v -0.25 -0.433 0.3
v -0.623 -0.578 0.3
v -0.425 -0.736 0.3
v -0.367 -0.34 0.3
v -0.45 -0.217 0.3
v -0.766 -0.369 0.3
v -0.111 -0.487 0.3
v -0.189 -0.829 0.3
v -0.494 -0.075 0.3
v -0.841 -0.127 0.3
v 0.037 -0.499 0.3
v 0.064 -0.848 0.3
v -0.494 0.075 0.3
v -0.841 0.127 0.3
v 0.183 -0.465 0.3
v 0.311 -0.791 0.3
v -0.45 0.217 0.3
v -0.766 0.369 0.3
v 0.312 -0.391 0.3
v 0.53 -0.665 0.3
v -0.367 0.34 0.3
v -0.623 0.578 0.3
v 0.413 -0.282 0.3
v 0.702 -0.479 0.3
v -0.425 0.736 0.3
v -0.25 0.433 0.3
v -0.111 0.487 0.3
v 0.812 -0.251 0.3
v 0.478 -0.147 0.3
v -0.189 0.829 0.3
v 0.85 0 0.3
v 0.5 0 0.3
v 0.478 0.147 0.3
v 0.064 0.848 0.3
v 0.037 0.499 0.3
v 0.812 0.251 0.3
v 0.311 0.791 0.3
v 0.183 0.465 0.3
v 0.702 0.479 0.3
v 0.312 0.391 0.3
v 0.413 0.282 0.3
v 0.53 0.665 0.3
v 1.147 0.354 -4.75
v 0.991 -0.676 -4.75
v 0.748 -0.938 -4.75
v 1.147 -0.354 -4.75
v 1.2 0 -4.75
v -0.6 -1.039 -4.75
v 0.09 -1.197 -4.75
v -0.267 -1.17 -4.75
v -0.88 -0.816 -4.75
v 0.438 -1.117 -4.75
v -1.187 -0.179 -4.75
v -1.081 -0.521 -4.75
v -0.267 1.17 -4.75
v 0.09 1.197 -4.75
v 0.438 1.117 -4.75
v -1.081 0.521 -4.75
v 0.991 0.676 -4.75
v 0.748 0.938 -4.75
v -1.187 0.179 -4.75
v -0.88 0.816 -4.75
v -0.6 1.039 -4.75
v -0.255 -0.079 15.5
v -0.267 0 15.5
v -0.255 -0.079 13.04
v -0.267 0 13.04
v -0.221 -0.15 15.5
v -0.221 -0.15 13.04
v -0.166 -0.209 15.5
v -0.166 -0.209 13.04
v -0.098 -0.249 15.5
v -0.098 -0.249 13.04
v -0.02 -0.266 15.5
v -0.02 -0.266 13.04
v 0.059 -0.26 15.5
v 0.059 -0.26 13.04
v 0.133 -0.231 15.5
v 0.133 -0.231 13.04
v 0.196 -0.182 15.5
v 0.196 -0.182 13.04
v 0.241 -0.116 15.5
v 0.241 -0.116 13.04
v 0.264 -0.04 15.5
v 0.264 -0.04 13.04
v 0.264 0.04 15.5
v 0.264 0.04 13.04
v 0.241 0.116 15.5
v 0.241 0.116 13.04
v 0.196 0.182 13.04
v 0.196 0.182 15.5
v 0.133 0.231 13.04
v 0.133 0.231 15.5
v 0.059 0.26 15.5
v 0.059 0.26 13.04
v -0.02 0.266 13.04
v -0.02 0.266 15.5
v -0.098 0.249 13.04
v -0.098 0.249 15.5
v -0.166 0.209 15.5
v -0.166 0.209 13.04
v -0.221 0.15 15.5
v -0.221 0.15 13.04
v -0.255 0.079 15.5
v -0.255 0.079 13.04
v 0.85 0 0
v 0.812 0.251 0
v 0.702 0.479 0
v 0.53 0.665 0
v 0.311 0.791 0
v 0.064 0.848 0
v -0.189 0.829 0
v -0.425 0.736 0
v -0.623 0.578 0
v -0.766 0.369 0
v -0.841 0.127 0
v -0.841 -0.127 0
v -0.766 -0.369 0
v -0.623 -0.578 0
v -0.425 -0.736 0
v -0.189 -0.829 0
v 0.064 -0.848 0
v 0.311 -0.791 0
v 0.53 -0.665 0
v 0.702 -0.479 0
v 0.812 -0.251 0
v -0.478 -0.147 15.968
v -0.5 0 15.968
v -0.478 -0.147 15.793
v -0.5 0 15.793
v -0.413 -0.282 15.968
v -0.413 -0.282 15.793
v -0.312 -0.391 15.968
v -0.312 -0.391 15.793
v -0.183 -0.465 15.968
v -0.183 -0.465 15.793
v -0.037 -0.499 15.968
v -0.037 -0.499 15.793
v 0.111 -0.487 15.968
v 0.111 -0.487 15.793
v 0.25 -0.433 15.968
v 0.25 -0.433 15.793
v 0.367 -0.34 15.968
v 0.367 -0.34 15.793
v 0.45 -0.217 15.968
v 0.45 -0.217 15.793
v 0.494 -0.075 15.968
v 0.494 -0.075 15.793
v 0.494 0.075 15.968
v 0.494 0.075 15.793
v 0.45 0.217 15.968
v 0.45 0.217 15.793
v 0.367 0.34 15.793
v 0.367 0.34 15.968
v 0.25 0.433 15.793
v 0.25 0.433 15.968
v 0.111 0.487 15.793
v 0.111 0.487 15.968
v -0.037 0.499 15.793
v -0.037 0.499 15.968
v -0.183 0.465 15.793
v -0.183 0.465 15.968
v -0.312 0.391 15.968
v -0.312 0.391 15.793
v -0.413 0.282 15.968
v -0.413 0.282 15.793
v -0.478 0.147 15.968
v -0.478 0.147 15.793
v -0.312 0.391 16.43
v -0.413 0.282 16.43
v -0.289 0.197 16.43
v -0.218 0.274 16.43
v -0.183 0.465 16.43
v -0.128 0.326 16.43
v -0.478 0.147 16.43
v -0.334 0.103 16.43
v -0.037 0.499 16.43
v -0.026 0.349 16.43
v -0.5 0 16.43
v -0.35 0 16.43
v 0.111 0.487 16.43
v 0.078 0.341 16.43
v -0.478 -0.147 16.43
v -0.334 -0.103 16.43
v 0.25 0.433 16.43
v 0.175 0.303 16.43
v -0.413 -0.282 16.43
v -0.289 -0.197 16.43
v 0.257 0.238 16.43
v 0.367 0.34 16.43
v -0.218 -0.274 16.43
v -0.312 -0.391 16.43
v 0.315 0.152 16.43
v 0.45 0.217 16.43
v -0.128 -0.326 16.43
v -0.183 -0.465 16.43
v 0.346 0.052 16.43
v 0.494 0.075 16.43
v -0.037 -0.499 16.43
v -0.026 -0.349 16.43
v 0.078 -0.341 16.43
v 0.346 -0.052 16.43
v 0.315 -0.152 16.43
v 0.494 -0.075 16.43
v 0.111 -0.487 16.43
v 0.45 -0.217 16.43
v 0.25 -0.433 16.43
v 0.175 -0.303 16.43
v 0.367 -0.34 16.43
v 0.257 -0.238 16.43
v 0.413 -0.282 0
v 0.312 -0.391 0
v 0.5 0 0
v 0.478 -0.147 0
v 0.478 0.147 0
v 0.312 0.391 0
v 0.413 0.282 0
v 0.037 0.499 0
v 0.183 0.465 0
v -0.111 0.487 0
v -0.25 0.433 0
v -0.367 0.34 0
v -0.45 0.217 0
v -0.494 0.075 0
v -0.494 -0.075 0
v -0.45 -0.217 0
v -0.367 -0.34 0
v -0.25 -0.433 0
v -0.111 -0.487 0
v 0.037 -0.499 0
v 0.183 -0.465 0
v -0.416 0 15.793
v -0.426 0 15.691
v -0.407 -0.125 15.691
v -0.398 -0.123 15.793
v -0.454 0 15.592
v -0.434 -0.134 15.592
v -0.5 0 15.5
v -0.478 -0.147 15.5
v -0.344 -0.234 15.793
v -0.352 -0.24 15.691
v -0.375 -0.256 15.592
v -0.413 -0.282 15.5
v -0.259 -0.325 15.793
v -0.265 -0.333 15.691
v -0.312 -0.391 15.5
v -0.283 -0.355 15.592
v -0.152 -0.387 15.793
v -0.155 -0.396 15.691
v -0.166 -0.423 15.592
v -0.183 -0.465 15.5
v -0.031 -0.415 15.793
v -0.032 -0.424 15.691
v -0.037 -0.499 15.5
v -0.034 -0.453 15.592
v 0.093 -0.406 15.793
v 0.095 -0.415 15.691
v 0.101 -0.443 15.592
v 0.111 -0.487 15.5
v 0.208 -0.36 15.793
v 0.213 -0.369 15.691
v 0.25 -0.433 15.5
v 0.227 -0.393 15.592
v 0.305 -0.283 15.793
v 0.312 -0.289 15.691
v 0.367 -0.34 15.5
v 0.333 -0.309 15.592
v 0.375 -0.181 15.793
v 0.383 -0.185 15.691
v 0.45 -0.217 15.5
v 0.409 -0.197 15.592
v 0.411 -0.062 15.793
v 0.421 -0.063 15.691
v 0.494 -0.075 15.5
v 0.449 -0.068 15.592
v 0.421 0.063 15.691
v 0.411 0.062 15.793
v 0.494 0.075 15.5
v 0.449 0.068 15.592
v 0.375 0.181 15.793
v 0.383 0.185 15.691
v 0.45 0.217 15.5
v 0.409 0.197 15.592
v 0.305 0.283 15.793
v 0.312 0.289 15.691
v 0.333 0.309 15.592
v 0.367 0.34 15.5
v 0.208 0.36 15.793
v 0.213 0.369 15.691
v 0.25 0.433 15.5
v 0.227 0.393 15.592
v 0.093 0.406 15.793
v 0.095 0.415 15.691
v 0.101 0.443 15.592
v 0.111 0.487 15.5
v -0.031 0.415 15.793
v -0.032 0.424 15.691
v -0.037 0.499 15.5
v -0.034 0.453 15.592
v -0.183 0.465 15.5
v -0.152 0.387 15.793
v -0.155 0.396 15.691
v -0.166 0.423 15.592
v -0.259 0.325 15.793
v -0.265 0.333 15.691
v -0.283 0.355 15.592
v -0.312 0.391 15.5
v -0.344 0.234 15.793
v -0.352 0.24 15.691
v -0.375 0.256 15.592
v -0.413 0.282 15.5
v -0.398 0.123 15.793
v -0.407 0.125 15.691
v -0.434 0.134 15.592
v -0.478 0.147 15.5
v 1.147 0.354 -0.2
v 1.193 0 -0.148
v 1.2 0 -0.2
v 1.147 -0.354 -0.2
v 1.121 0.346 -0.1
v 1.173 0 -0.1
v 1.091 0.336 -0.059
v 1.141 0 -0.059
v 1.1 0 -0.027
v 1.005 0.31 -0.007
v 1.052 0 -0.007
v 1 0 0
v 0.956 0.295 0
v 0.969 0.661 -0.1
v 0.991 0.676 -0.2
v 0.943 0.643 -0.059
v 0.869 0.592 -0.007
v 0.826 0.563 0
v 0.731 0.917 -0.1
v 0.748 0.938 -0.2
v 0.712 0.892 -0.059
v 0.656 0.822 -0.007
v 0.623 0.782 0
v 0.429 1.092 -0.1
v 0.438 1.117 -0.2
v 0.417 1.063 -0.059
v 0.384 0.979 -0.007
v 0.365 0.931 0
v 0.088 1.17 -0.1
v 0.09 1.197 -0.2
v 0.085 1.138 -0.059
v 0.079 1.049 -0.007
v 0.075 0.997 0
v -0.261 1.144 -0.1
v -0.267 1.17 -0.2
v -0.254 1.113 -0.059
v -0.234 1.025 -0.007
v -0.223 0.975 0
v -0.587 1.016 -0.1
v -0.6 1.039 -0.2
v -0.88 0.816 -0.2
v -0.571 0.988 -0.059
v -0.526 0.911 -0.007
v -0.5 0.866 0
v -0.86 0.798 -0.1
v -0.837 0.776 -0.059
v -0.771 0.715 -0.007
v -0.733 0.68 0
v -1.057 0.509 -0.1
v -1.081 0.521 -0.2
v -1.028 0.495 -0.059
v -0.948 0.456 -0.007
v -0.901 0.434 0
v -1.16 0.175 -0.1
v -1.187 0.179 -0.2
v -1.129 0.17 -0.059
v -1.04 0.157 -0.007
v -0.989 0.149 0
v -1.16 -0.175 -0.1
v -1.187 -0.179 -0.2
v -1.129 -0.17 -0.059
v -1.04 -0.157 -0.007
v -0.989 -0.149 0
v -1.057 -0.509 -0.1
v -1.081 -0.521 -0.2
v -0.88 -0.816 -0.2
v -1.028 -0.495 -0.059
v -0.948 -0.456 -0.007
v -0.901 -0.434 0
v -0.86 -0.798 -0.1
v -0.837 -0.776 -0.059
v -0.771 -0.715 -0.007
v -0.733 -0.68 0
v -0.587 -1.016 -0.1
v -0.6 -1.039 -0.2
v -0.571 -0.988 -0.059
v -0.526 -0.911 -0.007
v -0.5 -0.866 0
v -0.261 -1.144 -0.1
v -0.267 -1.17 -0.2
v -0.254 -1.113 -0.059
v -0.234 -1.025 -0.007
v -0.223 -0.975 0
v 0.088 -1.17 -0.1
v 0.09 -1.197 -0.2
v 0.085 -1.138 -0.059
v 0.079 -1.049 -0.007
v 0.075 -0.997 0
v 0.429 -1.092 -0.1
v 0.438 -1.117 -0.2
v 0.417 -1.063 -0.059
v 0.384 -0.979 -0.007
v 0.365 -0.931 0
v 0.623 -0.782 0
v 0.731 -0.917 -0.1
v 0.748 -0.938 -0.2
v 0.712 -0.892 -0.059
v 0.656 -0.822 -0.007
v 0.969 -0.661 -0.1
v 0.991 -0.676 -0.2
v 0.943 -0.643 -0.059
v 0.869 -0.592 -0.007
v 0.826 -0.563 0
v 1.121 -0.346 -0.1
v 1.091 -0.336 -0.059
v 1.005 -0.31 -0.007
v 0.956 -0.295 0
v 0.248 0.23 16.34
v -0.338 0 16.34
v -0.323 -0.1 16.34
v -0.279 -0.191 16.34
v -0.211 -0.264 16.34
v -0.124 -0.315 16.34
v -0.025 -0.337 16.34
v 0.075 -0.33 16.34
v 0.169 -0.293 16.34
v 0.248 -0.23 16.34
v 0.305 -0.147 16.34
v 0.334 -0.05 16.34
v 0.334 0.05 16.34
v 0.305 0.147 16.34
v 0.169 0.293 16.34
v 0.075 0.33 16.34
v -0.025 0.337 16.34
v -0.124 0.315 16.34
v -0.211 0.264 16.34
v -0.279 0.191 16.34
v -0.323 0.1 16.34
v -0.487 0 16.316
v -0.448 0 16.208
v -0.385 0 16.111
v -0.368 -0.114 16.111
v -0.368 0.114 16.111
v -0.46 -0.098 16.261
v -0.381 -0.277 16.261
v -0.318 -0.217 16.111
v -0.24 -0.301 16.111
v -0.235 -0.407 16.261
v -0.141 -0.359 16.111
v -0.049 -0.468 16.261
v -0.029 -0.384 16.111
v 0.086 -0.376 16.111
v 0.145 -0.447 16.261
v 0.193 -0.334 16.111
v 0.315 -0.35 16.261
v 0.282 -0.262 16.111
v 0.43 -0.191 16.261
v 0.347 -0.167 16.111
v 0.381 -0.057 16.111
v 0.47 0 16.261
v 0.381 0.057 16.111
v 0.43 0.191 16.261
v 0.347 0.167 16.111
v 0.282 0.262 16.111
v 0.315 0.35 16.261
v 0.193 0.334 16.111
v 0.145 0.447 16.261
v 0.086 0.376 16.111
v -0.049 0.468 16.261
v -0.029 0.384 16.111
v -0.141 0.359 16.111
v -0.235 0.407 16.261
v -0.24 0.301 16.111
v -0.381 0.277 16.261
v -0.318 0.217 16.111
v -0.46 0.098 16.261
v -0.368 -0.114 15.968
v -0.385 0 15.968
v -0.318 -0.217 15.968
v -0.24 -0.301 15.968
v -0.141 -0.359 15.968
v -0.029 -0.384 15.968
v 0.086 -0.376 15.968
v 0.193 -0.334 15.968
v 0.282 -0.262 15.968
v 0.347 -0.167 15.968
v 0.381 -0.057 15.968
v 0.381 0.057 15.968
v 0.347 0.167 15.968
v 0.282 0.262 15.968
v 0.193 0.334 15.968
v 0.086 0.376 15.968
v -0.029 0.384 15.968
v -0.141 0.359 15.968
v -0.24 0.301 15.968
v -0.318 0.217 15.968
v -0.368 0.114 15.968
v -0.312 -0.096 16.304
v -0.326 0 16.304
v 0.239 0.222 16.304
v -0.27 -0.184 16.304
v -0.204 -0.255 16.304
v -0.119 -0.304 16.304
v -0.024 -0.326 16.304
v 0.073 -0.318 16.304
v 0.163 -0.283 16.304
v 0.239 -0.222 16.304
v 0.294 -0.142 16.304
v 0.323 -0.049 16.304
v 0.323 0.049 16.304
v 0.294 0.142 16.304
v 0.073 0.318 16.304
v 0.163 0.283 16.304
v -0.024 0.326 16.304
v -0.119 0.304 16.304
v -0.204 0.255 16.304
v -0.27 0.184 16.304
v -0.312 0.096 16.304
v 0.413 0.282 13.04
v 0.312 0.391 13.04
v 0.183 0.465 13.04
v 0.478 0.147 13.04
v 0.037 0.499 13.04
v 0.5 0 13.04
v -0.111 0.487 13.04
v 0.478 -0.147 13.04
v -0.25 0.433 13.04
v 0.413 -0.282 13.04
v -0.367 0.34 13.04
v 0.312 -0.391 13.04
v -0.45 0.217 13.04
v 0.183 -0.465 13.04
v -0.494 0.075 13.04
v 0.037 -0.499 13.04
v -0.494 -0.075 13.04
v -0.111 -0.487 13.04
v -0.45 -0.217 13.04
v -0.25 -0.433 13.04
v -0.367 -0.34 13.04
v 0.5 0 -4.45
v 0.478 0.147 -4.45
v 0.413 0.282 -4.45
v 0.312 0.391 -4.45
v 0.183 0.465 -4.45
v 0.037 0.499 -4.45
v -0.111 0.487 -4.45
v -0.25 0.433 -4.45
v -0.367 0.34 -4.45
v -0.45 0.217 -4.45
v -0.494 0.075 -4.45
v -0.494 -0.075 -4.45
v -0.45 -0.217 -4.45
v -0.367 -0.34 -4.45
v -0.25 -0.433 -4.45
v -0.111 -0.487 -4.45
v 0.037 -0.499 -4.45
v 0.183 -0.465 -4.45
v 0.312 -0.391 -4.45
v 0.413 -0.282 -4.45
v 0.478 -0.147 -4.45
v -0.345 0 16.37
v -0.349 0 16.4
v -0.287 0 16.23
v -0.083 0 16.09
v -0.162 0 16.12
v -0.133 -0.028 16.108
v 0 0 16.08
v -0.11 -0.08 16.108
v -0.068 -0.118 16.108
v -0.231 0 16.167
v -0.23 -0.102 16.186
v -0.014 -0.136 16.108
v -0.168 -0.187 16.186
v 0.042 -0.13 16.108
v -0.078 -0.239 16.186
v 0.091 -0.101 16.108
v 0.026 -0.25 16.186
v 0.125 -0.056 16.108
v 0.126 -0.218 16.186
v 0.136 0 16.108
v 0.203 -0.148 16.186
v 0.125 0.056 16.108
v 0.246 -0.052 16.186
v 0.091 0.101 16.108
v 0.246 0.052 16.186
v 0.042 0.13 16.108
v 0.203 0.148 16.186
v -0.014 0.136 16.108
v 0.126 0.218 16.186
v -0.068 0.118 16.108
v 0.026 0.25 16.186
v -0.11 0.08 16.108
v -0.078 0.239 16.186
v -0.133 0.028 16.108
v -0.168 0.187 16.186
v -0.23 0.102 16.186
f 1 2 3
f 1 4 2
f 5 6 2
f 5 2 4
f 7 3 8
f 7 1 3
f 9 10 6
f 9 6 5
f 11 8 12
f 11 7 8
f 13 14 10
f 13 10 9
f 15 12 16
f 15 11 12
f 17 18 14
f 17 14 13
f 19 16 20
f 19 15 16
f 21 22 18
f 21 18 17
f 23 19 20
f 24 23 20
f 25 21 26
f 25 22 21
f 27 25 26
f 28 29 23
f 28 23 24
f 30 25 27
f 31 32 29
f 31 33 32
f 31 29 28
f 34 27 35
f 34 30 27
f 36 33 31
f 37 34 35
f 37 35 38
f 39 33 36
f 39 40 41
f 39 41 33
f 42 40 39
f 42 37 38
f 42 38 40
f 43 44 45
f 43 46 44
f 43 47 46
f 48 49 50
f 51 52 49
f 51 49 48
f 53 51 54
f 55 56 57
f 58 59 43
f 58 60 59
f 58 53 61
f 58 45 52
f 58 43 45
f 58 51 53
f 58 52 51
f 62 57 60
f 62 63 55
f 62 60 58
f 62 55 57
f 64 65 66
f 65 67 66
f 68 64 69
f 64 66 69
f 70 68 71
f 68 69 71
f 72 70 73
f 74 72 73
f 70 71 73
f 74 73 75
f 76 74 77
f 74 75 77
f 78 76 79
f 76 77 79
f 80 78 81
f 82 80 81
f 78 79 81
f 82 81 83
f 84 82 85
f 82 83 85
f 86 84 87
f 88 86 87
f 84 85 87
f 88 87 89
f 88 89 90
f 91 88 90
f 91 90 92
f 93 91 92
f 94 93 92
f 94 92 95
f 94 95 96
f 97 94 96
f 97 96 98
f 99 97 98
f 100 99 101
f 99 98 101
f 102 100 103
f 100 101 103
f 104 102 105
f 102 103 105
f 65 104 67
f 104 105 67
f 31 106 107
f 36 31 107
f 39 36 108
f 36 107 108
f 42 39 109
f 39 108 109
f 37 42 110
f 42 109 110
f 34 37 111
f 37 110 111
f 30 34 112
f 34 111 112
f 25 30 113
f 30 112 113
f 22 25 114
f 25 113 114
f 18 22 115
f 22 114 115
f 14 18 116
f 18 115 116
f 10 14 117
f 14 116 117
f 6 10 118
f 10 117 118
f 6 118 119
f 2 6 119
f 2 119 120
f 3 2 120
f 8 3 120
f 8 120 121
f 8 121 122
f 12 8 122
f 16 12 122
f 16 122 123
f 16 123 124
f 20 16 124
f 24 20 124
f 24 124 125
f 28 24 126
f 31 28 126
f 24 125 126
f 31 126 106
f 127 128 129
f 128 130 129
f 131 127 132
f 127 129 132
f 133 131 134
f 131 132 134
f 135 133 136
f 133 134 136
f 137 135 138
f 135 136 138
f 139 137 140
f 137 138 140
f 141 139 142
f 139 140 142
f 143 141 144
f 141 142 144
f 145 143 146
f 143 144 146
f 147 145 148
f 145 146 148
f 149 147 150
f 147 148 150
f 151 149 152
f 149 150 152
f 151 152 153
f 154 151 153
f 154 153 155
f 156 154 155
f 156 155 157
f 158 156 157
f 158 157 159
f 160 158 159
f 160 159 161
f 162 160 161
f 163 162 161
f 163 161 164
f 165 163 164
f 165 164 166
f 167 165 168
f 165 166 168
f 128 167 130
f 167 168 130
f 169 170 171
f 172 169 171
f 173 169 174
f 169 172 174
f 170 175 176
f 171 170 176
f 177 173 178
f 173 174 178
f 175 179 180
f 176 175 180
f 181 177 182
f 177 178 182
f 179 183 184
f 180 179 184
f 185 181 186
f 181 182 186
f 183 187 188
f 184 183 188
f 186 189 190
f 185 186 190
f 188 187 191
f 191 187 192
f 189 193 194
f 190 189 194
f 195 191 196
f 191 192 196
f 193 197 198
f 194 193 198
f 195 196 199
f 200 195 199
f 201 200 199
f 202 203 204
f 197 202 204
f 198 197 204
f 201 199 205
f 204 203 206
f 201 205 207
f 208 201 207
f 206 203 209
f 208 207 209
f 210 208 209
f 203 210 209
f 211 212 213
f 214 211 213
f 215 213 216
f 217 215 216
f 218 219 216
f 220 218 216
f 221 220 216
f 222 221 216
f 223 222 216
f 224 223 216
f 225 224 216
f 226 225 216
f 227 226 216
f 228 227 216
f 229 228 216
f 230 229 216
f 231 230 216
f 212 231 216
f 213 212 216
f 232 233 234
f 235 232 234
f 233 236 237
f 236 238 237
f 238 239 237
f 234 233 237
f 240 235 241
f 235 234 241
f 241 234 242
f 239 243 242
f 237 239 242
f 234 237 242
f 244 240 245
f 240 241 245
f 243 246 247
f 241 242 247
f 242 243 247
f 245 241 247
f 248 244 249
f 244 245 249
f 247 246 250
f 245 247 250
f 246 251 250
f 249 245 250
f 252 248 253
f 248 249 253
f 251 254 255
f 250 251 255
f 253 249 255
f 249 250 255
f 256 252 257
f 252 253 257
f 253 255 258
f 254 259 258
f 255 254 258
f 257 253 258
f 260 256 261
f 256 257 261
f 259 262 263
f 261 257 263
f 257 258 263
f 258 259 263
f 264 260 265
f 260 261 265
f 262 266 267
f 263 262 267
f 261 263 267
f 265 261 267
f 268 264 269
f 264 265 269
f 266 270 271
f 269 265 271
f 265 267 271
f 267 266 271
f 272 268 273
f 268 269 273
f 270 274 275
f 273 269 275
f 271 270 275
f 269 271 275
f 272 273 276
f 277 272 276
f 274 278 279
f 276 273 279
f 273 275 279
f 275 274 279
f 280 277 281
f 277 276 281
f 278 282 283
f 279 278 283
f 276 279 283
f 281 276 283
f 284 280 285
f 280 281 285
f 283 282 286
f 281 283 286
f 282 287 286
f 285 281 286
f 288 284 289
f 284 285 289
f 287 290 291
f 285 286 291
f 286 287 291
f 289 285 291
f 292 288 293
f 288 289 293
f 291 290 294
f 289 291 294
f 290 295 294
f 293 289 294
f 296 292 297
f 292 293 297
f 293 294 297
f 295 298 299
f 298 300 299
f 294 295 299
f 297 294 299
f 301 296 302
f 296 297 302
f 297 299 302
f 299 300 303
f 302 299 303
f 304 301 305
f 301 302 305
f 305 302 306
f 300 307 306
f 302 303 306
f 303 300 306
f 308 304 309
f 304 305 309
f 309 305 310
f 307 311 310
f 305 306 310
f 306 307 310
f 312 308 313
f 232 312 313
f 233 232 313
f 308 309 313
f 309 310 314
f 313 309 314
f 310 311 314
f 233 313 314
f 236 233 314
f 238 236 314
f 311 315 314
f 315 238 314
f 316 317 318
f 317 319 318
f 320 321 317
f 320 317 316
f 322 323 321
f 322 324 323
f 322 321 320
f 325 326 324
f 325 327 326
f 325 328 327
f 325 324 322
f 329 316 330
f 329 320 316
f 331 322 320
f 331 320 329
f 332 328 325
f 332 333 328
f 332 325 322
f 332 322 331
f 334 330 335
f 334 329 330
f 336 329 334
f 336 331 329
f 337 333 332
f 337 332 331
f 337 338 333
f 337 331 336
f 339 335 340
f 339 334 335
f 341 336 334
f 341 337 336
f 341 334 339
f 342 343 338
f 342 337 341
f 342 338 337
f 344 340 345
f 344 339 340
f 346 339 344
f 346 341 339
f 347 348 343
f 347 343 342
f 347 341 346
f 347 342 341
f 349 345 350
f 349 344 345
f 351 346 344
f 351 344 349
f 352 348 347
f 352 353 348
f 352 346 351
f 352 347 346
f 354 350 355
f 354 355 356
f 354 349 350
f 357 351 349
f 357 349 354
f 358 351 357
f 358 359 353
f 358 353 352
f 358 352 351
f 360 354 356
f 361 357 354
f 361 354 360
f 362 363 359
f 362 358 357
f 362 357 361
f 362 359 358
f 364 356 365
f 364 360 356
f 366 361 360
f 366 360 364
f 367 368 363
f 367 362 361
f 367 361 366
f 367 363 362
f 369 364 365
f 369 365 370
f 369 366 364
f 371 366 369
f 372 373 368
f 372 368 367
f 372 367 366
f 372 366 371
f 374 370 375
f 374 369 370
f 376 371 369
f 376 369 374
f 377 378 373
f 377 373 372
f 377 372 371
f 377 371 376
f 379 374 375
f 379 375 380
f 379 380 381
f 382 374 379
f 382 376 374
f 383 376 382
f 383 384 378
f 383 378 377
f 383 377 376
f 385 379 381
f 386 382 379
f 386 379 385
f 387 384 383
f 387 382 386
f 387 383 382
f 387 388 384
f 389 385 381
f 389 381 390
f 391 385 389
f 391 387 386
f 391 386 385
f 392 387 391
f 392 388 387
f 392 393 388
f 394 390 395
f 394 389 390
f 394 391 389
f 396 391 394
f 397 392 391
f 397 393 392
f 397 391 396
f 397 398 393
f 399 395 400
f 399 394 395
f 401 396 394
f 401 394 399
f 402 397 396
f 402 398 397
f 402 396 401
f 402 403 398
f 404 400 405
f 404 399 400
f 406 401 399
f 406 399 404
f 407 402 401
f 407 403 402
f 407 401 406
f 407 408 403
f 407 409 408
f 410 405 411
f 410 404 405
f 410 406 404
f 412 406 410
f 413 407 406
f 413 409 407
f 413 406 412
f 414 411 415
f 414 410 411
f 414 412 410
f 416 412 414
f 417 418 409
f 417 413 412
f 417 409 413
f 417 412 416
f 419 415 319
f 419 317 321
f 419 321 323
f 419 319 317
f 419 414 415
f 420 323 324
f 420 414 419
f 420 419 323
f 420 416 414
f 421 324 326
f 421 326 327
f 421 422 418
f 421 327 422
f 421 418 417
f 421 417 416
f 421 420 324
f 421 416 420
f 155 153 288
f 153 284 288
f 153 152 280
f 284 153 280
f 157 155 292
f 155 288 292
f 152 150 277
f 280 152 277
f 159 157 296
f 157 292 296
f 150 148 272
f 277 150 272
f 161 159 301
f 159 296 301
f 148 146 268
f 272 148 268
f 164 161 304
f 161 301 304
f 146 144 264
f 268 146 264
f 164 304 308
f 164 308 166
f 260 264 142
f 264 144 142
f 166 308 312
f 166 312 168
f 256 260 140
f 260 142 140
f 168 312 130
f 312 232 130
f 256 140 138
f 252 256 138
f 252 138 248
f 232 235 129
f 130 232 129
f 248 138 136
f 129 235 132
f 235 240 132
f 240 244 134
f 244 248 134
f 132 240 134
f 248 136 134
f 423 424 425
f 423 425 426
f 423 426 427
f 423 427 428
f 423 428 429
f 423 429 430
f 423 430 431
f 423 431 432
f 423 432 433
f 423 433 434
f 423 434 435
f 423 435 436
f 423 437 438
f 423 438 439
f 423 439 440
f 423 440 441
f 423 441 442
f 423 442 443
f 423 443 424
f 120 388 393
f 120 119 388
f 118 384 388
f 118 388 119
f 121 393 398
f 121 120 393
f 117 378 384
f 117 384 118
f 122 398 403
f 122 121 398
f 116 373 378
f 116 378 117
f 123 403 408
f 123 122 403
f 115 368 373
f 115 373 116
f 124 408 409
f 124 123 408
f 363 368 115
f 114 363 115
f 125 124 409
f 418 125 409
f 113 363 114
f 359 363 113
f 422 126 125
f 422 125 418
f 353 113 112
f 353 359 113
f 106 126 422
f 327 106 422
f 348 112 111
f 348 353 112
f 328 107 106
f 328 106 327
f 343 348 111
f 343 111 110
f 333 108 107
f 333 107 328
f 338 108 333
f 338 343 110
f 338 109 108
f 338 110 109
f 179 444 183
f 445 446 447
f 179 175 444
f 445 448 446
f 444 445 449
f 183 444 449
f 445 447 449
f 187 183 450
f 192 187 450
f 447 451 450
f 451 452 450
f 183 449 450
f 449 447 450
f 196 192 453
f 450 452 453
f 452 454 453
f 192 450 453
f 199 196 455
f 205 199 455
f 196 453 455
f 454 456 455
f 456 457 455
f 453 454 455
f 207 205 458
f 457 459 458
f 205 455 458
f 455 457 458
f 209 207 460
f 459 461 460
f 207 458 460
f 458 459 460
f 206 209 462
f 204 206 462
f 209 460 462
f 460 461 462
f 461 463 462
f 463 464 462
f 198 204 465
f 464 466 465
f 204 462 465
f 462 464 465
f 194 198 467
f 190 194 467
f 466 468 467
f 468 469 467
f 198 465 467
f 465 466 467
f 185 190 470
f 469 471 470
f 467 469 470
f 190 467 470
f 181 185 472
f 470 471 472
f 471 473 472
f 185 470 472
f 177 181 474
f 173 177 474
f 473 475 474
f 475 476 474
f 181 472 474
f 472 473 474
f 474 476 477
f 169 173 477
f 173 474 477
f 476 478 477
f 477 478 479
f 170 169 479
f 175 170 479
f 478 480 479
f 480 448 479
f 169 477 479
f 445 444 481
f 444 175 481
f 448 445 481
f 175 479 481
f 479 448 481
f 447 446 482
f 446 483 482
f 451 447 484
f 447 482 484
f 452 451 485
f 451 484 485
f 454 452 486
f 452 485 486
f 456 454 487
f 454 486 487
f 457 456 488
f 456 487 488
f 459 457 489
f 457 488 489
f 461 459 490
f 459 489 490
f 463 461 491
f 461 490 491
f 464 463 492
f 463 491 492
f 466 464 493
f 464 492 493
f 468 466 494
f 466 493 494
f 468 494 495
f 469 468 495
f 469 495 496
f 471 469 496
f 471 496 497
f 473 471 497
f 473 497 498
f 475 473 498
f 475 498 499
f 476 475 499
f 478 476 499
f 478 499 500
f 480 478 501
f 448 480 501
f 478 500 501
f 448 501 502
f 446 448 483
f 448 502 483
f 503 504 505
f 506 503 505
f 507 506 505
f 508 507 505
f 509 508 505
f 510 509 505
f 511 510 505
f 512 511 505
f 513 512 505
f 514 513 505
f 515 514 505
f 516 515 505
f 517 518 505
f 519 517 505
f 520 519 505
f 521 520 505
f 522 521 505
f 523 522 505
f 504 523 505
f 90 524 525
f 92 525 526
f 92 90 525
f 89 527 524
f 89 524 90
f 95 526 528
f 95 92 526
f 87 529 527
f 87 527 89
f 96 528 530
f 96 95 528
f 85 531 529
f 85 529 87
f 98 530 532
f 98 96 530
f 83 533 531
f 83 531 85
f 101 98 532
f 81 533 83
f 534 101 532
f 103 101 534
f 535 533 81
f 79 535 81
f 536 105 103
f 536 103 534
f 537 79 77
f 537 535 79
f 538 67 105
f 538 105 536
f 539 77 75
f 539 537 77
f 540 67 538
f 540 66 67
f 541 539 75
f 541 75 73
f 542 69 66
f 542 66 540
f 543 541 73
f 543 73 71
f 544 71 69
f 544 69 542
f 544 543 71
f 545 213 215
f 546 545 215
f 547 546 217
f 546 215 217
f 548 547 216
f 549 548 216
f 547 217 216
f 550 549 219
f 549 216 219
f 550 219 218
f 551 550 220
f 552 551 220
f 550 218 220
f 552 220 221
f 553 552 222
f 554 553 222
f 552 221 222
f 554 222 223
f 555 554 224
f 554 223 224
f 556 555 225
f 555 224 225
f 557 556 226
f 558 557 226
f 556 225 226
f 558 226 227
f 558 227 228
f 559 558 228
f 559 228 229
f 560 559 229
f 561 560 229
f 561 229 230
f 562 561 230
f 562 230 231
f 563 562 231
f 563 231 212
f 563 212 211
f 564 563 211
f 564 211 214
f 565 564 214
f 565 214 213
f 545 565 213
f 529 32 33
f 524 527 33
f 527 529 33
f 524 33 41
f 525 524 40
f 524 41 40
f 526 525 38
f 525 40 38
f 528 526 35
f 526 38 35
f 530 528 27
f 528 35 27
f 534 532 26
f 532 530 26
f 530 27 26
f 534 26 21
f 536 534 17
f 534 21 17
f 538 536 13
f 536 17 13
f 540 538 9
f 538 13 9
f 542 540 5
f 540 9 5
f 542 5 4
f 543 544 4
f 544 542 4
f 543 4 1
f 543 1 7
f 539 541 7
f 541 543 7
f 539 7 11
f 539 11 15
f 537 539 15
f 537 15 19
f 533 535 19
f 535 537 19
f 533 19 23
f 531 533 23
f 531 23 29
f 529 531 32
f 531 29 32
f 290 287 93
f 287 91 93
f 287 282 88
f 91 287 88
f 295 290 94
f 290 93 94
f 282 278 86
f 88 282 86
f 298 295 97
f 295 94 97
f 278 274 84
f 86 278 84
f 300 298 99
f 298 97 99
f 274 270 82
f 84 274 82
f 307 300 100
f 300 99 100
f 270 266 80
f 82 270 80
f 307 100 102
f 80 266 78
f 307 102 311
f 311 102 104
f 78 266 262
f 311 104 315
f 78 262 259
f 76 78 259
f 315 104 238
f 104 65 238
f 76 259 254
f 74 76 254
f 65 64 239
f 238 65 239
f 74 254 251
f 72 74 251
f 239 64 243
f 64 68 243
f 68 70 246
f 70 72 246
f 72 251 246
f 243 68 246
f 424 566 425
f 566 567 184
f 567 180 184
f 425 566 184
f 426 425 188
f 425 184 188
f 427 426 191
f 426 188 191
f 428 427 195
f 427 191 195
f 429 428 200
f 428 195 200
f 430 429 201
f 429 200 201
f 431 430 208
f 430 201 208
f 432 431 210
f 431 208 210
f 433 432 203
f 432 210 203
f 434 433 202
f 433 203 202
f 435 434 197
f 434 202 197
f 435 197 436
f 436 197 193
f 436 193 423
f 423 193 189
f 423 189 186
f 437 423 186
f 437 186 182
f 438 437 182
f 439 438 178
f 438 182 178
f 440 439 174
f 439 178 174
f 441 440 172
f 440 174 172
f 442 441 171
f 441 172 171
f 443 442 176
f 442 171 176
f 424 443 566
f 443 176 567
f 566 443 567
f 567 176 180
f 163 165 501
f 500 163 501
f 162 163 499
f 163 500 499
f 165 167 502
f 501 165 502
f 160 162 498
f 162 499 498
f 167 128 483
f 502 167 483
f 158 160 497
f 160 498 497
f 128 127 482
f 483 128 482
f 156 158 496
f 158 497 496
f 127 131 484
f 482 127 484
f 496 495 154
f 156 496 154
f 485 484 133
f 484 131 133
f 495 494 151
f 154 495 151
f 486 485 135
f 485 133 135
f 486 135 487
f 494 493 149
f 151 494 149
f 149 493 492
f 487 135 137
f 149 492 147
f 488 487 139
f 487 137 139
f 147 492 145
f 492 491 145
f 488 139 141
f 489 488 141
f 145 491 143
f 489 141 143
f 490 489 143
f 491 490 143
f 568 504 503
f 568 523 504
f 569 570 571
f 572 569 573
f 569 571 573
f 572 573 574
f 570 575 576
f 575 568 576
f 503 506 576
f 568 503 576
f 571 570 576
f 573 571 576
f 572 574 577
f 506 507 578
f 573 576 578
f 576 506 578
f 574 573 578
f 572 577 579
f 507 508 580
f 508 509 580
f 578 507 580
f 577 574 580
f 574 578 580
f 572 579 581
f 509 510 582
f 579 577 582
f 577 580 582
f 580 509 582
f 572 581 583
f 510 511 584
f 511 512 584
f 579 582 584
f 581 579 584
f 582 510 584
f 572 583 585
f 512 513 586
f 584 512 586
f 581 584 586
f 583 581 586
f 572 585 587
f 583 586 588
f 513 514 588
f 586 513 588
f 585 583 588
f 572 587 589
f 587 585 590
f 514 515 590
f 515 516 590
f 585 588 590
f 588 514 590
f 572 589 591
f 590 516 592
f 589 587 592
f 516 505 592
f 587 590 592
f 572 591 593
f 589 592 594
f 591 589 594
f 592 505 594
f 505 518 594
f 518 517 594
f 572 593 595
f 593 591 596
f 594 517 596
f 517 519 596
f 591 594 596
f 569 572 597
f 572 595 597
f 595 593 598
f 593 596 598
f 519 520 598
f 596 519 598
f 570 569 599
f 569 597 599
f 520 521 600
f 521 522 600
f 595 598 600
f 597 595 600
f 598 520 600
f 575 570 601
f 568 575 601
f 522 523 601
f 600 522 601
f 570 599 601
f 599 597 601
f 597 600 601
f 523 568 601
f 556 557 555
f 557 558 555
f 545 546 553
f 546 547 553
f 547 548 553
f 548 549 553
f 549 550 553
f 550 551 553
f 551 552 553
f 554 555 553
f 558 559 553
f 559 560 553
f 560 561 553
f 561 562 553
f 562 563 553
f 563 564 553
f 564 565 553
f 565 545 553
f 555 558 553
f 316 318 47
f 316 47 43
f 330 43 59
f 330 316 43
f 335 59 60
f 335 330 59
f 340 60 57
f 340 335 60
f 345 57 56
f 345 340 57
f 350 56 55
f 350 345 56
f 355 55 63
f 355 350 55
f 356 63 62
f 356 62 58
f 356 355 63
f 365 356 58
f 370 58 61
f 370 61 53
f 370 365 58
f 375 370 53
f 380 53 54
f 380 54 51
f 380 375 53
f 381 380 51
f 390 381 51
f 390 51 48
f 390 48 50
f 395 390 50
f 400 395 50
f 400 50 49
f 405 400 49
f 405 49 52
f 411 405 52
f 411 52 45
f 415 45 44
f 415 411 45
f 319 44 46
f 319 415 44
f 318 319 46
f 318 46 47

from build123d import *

# Parameters (mm, degrees)
SKETCH1_R           = 0.5
BOSS_EXTRUDE1_DEPTH = 15.5
SKETCH1_3_R         = 1.2
SKETCH1_3_R_2       = 0.5
BOSS_EXTRUDE2_DEPTH = 4.75
FILLET1_R           = 0.2
SKETCH2_R           = 0.85
BOSS_EXTRUDE3_DEPTH = 0.3
SKETCH4_W           = 0.471869861
SKETCH4_H           = 0.036263573
SKETCH5_W           = 0.976937104
SKETCH5_H           = 2.46
SKETCH6_R           = 0.5
BOSS_EXTRUDE5_DEPTH = 0.3


with BuildPart() as part:
    # Sketch1 → Boss-Extrude1 (new body)
    with BuildSketch(Plane.XY):
        Circle(SKETCH1_R)
    extrude(amount=BOSS_EXTRUDE1_DEPTH)



with BuildPart() as body_2:
    # Sketch1<3> → Boss-Extrude2 (new body)
    with BuildSketch(Plane.XY):
        Circle(SKETCH1_3_R)
        Circle(SKETCH1_3_R_2, mode=Mode.SUBTRACT)
    extrude(amount=-BOSS_EXTRUDE2_DEPTH)

    # Fillet1
    fillet1_edges = [body_2.edges().sort_by_distance(p)[0] for p in [
        (-1.2, 0, 0),
    ]]
    fillet(fillet1_edges, radius=FILLET1_R)


with BuildPart() as part_1:
    add(part.part)

    add(body_2.part)  # Boss-Extrude3 merges body 2
    # Sketch2 → Boss-Extrude3 (add)
    with BuildSketch(Plane.XY):
        Circle(SKETCH2_R)
    extrude(amount=BOSS_EXTRUDE3_DEPTH)

    # Sketch3 → Revolve1 (revolve)
    with BuildSketch(Plane(origin=(0, 0, 0), x_dir=(1, 0, 0), z_dir=(0, 1, 0))):
        with BuildLine():
            Line((0.5, -15.5), (0, -15.5))
            Line((0, -15.5), (0, -16.08))
            ThreePointArc((0, -16.08), (0.247487373, -16.182512627), (0.35, -16.43))
            Line((0.35, -16.43), (0.5, -16.43))
            ThreePointArc((0.5, -16.43), (0.470461057, -16.26068847), (0.385334423, -16.111382075))
            Line((0.385334423, -16.111382075), (0.385334423, -15.967978567))
            Line((0.385334423, -15.967978567), (0.5, -15.967978567))
            Line((0.5, -15.967978567), (0.5, -15.793310987))
            Line((0.5, -15.793310987), (0.416056351, -15.793310987))
            ThreePointArc((0.416056351, -15.793310987), (0.437455238, -15.640767656), (0.5, -15.5))
        make_face()
    revolve(axis=Axis((0, 0, 15.5), (0, 0, 1)))

    # Sketch4 → Revolve2 (revolve)
    with BuildSketch(Plane(origin=(0, 0, 0), x_dir=(1, 0, 0), z_dir=(0, 1, 0))):
        with Locations((-0.235934931, -16.321868214)):
            Rectangle(SKETCH4_W, SKETCH4_H)
    revolve(axis=Axis((0, 0, 15.5), (0, 0, 1)))

    # Sketch5 → Cut-Revolve1 (revolve, cut)
    with BuildSketch(Plane(origin=(0, 0, 0), x_dir=(1, 0, 0), z_dir=(0, 1, 0))):
        with Locations((-0.755461177, -14.27)):
            Rectangle(SKETCH5_W, SKETCH5_H)
    revolve(axis=Axis((0, 0, 15.5), (0, 0, 1)), mode=Mode.SUBTRACT)

    # Sketch6 → Boss-Extrude5 (add)
    with BuildSketch(Plane(origin=(0, 0, -4.75), x_dir=(-1, 0, 0), z_dir=(0, 0, -1))):
        Circle(SKETCH6_R)
    extrude(amount=-BOSS_EXTRUDE5_DEPTH)


solid = part_1.part
